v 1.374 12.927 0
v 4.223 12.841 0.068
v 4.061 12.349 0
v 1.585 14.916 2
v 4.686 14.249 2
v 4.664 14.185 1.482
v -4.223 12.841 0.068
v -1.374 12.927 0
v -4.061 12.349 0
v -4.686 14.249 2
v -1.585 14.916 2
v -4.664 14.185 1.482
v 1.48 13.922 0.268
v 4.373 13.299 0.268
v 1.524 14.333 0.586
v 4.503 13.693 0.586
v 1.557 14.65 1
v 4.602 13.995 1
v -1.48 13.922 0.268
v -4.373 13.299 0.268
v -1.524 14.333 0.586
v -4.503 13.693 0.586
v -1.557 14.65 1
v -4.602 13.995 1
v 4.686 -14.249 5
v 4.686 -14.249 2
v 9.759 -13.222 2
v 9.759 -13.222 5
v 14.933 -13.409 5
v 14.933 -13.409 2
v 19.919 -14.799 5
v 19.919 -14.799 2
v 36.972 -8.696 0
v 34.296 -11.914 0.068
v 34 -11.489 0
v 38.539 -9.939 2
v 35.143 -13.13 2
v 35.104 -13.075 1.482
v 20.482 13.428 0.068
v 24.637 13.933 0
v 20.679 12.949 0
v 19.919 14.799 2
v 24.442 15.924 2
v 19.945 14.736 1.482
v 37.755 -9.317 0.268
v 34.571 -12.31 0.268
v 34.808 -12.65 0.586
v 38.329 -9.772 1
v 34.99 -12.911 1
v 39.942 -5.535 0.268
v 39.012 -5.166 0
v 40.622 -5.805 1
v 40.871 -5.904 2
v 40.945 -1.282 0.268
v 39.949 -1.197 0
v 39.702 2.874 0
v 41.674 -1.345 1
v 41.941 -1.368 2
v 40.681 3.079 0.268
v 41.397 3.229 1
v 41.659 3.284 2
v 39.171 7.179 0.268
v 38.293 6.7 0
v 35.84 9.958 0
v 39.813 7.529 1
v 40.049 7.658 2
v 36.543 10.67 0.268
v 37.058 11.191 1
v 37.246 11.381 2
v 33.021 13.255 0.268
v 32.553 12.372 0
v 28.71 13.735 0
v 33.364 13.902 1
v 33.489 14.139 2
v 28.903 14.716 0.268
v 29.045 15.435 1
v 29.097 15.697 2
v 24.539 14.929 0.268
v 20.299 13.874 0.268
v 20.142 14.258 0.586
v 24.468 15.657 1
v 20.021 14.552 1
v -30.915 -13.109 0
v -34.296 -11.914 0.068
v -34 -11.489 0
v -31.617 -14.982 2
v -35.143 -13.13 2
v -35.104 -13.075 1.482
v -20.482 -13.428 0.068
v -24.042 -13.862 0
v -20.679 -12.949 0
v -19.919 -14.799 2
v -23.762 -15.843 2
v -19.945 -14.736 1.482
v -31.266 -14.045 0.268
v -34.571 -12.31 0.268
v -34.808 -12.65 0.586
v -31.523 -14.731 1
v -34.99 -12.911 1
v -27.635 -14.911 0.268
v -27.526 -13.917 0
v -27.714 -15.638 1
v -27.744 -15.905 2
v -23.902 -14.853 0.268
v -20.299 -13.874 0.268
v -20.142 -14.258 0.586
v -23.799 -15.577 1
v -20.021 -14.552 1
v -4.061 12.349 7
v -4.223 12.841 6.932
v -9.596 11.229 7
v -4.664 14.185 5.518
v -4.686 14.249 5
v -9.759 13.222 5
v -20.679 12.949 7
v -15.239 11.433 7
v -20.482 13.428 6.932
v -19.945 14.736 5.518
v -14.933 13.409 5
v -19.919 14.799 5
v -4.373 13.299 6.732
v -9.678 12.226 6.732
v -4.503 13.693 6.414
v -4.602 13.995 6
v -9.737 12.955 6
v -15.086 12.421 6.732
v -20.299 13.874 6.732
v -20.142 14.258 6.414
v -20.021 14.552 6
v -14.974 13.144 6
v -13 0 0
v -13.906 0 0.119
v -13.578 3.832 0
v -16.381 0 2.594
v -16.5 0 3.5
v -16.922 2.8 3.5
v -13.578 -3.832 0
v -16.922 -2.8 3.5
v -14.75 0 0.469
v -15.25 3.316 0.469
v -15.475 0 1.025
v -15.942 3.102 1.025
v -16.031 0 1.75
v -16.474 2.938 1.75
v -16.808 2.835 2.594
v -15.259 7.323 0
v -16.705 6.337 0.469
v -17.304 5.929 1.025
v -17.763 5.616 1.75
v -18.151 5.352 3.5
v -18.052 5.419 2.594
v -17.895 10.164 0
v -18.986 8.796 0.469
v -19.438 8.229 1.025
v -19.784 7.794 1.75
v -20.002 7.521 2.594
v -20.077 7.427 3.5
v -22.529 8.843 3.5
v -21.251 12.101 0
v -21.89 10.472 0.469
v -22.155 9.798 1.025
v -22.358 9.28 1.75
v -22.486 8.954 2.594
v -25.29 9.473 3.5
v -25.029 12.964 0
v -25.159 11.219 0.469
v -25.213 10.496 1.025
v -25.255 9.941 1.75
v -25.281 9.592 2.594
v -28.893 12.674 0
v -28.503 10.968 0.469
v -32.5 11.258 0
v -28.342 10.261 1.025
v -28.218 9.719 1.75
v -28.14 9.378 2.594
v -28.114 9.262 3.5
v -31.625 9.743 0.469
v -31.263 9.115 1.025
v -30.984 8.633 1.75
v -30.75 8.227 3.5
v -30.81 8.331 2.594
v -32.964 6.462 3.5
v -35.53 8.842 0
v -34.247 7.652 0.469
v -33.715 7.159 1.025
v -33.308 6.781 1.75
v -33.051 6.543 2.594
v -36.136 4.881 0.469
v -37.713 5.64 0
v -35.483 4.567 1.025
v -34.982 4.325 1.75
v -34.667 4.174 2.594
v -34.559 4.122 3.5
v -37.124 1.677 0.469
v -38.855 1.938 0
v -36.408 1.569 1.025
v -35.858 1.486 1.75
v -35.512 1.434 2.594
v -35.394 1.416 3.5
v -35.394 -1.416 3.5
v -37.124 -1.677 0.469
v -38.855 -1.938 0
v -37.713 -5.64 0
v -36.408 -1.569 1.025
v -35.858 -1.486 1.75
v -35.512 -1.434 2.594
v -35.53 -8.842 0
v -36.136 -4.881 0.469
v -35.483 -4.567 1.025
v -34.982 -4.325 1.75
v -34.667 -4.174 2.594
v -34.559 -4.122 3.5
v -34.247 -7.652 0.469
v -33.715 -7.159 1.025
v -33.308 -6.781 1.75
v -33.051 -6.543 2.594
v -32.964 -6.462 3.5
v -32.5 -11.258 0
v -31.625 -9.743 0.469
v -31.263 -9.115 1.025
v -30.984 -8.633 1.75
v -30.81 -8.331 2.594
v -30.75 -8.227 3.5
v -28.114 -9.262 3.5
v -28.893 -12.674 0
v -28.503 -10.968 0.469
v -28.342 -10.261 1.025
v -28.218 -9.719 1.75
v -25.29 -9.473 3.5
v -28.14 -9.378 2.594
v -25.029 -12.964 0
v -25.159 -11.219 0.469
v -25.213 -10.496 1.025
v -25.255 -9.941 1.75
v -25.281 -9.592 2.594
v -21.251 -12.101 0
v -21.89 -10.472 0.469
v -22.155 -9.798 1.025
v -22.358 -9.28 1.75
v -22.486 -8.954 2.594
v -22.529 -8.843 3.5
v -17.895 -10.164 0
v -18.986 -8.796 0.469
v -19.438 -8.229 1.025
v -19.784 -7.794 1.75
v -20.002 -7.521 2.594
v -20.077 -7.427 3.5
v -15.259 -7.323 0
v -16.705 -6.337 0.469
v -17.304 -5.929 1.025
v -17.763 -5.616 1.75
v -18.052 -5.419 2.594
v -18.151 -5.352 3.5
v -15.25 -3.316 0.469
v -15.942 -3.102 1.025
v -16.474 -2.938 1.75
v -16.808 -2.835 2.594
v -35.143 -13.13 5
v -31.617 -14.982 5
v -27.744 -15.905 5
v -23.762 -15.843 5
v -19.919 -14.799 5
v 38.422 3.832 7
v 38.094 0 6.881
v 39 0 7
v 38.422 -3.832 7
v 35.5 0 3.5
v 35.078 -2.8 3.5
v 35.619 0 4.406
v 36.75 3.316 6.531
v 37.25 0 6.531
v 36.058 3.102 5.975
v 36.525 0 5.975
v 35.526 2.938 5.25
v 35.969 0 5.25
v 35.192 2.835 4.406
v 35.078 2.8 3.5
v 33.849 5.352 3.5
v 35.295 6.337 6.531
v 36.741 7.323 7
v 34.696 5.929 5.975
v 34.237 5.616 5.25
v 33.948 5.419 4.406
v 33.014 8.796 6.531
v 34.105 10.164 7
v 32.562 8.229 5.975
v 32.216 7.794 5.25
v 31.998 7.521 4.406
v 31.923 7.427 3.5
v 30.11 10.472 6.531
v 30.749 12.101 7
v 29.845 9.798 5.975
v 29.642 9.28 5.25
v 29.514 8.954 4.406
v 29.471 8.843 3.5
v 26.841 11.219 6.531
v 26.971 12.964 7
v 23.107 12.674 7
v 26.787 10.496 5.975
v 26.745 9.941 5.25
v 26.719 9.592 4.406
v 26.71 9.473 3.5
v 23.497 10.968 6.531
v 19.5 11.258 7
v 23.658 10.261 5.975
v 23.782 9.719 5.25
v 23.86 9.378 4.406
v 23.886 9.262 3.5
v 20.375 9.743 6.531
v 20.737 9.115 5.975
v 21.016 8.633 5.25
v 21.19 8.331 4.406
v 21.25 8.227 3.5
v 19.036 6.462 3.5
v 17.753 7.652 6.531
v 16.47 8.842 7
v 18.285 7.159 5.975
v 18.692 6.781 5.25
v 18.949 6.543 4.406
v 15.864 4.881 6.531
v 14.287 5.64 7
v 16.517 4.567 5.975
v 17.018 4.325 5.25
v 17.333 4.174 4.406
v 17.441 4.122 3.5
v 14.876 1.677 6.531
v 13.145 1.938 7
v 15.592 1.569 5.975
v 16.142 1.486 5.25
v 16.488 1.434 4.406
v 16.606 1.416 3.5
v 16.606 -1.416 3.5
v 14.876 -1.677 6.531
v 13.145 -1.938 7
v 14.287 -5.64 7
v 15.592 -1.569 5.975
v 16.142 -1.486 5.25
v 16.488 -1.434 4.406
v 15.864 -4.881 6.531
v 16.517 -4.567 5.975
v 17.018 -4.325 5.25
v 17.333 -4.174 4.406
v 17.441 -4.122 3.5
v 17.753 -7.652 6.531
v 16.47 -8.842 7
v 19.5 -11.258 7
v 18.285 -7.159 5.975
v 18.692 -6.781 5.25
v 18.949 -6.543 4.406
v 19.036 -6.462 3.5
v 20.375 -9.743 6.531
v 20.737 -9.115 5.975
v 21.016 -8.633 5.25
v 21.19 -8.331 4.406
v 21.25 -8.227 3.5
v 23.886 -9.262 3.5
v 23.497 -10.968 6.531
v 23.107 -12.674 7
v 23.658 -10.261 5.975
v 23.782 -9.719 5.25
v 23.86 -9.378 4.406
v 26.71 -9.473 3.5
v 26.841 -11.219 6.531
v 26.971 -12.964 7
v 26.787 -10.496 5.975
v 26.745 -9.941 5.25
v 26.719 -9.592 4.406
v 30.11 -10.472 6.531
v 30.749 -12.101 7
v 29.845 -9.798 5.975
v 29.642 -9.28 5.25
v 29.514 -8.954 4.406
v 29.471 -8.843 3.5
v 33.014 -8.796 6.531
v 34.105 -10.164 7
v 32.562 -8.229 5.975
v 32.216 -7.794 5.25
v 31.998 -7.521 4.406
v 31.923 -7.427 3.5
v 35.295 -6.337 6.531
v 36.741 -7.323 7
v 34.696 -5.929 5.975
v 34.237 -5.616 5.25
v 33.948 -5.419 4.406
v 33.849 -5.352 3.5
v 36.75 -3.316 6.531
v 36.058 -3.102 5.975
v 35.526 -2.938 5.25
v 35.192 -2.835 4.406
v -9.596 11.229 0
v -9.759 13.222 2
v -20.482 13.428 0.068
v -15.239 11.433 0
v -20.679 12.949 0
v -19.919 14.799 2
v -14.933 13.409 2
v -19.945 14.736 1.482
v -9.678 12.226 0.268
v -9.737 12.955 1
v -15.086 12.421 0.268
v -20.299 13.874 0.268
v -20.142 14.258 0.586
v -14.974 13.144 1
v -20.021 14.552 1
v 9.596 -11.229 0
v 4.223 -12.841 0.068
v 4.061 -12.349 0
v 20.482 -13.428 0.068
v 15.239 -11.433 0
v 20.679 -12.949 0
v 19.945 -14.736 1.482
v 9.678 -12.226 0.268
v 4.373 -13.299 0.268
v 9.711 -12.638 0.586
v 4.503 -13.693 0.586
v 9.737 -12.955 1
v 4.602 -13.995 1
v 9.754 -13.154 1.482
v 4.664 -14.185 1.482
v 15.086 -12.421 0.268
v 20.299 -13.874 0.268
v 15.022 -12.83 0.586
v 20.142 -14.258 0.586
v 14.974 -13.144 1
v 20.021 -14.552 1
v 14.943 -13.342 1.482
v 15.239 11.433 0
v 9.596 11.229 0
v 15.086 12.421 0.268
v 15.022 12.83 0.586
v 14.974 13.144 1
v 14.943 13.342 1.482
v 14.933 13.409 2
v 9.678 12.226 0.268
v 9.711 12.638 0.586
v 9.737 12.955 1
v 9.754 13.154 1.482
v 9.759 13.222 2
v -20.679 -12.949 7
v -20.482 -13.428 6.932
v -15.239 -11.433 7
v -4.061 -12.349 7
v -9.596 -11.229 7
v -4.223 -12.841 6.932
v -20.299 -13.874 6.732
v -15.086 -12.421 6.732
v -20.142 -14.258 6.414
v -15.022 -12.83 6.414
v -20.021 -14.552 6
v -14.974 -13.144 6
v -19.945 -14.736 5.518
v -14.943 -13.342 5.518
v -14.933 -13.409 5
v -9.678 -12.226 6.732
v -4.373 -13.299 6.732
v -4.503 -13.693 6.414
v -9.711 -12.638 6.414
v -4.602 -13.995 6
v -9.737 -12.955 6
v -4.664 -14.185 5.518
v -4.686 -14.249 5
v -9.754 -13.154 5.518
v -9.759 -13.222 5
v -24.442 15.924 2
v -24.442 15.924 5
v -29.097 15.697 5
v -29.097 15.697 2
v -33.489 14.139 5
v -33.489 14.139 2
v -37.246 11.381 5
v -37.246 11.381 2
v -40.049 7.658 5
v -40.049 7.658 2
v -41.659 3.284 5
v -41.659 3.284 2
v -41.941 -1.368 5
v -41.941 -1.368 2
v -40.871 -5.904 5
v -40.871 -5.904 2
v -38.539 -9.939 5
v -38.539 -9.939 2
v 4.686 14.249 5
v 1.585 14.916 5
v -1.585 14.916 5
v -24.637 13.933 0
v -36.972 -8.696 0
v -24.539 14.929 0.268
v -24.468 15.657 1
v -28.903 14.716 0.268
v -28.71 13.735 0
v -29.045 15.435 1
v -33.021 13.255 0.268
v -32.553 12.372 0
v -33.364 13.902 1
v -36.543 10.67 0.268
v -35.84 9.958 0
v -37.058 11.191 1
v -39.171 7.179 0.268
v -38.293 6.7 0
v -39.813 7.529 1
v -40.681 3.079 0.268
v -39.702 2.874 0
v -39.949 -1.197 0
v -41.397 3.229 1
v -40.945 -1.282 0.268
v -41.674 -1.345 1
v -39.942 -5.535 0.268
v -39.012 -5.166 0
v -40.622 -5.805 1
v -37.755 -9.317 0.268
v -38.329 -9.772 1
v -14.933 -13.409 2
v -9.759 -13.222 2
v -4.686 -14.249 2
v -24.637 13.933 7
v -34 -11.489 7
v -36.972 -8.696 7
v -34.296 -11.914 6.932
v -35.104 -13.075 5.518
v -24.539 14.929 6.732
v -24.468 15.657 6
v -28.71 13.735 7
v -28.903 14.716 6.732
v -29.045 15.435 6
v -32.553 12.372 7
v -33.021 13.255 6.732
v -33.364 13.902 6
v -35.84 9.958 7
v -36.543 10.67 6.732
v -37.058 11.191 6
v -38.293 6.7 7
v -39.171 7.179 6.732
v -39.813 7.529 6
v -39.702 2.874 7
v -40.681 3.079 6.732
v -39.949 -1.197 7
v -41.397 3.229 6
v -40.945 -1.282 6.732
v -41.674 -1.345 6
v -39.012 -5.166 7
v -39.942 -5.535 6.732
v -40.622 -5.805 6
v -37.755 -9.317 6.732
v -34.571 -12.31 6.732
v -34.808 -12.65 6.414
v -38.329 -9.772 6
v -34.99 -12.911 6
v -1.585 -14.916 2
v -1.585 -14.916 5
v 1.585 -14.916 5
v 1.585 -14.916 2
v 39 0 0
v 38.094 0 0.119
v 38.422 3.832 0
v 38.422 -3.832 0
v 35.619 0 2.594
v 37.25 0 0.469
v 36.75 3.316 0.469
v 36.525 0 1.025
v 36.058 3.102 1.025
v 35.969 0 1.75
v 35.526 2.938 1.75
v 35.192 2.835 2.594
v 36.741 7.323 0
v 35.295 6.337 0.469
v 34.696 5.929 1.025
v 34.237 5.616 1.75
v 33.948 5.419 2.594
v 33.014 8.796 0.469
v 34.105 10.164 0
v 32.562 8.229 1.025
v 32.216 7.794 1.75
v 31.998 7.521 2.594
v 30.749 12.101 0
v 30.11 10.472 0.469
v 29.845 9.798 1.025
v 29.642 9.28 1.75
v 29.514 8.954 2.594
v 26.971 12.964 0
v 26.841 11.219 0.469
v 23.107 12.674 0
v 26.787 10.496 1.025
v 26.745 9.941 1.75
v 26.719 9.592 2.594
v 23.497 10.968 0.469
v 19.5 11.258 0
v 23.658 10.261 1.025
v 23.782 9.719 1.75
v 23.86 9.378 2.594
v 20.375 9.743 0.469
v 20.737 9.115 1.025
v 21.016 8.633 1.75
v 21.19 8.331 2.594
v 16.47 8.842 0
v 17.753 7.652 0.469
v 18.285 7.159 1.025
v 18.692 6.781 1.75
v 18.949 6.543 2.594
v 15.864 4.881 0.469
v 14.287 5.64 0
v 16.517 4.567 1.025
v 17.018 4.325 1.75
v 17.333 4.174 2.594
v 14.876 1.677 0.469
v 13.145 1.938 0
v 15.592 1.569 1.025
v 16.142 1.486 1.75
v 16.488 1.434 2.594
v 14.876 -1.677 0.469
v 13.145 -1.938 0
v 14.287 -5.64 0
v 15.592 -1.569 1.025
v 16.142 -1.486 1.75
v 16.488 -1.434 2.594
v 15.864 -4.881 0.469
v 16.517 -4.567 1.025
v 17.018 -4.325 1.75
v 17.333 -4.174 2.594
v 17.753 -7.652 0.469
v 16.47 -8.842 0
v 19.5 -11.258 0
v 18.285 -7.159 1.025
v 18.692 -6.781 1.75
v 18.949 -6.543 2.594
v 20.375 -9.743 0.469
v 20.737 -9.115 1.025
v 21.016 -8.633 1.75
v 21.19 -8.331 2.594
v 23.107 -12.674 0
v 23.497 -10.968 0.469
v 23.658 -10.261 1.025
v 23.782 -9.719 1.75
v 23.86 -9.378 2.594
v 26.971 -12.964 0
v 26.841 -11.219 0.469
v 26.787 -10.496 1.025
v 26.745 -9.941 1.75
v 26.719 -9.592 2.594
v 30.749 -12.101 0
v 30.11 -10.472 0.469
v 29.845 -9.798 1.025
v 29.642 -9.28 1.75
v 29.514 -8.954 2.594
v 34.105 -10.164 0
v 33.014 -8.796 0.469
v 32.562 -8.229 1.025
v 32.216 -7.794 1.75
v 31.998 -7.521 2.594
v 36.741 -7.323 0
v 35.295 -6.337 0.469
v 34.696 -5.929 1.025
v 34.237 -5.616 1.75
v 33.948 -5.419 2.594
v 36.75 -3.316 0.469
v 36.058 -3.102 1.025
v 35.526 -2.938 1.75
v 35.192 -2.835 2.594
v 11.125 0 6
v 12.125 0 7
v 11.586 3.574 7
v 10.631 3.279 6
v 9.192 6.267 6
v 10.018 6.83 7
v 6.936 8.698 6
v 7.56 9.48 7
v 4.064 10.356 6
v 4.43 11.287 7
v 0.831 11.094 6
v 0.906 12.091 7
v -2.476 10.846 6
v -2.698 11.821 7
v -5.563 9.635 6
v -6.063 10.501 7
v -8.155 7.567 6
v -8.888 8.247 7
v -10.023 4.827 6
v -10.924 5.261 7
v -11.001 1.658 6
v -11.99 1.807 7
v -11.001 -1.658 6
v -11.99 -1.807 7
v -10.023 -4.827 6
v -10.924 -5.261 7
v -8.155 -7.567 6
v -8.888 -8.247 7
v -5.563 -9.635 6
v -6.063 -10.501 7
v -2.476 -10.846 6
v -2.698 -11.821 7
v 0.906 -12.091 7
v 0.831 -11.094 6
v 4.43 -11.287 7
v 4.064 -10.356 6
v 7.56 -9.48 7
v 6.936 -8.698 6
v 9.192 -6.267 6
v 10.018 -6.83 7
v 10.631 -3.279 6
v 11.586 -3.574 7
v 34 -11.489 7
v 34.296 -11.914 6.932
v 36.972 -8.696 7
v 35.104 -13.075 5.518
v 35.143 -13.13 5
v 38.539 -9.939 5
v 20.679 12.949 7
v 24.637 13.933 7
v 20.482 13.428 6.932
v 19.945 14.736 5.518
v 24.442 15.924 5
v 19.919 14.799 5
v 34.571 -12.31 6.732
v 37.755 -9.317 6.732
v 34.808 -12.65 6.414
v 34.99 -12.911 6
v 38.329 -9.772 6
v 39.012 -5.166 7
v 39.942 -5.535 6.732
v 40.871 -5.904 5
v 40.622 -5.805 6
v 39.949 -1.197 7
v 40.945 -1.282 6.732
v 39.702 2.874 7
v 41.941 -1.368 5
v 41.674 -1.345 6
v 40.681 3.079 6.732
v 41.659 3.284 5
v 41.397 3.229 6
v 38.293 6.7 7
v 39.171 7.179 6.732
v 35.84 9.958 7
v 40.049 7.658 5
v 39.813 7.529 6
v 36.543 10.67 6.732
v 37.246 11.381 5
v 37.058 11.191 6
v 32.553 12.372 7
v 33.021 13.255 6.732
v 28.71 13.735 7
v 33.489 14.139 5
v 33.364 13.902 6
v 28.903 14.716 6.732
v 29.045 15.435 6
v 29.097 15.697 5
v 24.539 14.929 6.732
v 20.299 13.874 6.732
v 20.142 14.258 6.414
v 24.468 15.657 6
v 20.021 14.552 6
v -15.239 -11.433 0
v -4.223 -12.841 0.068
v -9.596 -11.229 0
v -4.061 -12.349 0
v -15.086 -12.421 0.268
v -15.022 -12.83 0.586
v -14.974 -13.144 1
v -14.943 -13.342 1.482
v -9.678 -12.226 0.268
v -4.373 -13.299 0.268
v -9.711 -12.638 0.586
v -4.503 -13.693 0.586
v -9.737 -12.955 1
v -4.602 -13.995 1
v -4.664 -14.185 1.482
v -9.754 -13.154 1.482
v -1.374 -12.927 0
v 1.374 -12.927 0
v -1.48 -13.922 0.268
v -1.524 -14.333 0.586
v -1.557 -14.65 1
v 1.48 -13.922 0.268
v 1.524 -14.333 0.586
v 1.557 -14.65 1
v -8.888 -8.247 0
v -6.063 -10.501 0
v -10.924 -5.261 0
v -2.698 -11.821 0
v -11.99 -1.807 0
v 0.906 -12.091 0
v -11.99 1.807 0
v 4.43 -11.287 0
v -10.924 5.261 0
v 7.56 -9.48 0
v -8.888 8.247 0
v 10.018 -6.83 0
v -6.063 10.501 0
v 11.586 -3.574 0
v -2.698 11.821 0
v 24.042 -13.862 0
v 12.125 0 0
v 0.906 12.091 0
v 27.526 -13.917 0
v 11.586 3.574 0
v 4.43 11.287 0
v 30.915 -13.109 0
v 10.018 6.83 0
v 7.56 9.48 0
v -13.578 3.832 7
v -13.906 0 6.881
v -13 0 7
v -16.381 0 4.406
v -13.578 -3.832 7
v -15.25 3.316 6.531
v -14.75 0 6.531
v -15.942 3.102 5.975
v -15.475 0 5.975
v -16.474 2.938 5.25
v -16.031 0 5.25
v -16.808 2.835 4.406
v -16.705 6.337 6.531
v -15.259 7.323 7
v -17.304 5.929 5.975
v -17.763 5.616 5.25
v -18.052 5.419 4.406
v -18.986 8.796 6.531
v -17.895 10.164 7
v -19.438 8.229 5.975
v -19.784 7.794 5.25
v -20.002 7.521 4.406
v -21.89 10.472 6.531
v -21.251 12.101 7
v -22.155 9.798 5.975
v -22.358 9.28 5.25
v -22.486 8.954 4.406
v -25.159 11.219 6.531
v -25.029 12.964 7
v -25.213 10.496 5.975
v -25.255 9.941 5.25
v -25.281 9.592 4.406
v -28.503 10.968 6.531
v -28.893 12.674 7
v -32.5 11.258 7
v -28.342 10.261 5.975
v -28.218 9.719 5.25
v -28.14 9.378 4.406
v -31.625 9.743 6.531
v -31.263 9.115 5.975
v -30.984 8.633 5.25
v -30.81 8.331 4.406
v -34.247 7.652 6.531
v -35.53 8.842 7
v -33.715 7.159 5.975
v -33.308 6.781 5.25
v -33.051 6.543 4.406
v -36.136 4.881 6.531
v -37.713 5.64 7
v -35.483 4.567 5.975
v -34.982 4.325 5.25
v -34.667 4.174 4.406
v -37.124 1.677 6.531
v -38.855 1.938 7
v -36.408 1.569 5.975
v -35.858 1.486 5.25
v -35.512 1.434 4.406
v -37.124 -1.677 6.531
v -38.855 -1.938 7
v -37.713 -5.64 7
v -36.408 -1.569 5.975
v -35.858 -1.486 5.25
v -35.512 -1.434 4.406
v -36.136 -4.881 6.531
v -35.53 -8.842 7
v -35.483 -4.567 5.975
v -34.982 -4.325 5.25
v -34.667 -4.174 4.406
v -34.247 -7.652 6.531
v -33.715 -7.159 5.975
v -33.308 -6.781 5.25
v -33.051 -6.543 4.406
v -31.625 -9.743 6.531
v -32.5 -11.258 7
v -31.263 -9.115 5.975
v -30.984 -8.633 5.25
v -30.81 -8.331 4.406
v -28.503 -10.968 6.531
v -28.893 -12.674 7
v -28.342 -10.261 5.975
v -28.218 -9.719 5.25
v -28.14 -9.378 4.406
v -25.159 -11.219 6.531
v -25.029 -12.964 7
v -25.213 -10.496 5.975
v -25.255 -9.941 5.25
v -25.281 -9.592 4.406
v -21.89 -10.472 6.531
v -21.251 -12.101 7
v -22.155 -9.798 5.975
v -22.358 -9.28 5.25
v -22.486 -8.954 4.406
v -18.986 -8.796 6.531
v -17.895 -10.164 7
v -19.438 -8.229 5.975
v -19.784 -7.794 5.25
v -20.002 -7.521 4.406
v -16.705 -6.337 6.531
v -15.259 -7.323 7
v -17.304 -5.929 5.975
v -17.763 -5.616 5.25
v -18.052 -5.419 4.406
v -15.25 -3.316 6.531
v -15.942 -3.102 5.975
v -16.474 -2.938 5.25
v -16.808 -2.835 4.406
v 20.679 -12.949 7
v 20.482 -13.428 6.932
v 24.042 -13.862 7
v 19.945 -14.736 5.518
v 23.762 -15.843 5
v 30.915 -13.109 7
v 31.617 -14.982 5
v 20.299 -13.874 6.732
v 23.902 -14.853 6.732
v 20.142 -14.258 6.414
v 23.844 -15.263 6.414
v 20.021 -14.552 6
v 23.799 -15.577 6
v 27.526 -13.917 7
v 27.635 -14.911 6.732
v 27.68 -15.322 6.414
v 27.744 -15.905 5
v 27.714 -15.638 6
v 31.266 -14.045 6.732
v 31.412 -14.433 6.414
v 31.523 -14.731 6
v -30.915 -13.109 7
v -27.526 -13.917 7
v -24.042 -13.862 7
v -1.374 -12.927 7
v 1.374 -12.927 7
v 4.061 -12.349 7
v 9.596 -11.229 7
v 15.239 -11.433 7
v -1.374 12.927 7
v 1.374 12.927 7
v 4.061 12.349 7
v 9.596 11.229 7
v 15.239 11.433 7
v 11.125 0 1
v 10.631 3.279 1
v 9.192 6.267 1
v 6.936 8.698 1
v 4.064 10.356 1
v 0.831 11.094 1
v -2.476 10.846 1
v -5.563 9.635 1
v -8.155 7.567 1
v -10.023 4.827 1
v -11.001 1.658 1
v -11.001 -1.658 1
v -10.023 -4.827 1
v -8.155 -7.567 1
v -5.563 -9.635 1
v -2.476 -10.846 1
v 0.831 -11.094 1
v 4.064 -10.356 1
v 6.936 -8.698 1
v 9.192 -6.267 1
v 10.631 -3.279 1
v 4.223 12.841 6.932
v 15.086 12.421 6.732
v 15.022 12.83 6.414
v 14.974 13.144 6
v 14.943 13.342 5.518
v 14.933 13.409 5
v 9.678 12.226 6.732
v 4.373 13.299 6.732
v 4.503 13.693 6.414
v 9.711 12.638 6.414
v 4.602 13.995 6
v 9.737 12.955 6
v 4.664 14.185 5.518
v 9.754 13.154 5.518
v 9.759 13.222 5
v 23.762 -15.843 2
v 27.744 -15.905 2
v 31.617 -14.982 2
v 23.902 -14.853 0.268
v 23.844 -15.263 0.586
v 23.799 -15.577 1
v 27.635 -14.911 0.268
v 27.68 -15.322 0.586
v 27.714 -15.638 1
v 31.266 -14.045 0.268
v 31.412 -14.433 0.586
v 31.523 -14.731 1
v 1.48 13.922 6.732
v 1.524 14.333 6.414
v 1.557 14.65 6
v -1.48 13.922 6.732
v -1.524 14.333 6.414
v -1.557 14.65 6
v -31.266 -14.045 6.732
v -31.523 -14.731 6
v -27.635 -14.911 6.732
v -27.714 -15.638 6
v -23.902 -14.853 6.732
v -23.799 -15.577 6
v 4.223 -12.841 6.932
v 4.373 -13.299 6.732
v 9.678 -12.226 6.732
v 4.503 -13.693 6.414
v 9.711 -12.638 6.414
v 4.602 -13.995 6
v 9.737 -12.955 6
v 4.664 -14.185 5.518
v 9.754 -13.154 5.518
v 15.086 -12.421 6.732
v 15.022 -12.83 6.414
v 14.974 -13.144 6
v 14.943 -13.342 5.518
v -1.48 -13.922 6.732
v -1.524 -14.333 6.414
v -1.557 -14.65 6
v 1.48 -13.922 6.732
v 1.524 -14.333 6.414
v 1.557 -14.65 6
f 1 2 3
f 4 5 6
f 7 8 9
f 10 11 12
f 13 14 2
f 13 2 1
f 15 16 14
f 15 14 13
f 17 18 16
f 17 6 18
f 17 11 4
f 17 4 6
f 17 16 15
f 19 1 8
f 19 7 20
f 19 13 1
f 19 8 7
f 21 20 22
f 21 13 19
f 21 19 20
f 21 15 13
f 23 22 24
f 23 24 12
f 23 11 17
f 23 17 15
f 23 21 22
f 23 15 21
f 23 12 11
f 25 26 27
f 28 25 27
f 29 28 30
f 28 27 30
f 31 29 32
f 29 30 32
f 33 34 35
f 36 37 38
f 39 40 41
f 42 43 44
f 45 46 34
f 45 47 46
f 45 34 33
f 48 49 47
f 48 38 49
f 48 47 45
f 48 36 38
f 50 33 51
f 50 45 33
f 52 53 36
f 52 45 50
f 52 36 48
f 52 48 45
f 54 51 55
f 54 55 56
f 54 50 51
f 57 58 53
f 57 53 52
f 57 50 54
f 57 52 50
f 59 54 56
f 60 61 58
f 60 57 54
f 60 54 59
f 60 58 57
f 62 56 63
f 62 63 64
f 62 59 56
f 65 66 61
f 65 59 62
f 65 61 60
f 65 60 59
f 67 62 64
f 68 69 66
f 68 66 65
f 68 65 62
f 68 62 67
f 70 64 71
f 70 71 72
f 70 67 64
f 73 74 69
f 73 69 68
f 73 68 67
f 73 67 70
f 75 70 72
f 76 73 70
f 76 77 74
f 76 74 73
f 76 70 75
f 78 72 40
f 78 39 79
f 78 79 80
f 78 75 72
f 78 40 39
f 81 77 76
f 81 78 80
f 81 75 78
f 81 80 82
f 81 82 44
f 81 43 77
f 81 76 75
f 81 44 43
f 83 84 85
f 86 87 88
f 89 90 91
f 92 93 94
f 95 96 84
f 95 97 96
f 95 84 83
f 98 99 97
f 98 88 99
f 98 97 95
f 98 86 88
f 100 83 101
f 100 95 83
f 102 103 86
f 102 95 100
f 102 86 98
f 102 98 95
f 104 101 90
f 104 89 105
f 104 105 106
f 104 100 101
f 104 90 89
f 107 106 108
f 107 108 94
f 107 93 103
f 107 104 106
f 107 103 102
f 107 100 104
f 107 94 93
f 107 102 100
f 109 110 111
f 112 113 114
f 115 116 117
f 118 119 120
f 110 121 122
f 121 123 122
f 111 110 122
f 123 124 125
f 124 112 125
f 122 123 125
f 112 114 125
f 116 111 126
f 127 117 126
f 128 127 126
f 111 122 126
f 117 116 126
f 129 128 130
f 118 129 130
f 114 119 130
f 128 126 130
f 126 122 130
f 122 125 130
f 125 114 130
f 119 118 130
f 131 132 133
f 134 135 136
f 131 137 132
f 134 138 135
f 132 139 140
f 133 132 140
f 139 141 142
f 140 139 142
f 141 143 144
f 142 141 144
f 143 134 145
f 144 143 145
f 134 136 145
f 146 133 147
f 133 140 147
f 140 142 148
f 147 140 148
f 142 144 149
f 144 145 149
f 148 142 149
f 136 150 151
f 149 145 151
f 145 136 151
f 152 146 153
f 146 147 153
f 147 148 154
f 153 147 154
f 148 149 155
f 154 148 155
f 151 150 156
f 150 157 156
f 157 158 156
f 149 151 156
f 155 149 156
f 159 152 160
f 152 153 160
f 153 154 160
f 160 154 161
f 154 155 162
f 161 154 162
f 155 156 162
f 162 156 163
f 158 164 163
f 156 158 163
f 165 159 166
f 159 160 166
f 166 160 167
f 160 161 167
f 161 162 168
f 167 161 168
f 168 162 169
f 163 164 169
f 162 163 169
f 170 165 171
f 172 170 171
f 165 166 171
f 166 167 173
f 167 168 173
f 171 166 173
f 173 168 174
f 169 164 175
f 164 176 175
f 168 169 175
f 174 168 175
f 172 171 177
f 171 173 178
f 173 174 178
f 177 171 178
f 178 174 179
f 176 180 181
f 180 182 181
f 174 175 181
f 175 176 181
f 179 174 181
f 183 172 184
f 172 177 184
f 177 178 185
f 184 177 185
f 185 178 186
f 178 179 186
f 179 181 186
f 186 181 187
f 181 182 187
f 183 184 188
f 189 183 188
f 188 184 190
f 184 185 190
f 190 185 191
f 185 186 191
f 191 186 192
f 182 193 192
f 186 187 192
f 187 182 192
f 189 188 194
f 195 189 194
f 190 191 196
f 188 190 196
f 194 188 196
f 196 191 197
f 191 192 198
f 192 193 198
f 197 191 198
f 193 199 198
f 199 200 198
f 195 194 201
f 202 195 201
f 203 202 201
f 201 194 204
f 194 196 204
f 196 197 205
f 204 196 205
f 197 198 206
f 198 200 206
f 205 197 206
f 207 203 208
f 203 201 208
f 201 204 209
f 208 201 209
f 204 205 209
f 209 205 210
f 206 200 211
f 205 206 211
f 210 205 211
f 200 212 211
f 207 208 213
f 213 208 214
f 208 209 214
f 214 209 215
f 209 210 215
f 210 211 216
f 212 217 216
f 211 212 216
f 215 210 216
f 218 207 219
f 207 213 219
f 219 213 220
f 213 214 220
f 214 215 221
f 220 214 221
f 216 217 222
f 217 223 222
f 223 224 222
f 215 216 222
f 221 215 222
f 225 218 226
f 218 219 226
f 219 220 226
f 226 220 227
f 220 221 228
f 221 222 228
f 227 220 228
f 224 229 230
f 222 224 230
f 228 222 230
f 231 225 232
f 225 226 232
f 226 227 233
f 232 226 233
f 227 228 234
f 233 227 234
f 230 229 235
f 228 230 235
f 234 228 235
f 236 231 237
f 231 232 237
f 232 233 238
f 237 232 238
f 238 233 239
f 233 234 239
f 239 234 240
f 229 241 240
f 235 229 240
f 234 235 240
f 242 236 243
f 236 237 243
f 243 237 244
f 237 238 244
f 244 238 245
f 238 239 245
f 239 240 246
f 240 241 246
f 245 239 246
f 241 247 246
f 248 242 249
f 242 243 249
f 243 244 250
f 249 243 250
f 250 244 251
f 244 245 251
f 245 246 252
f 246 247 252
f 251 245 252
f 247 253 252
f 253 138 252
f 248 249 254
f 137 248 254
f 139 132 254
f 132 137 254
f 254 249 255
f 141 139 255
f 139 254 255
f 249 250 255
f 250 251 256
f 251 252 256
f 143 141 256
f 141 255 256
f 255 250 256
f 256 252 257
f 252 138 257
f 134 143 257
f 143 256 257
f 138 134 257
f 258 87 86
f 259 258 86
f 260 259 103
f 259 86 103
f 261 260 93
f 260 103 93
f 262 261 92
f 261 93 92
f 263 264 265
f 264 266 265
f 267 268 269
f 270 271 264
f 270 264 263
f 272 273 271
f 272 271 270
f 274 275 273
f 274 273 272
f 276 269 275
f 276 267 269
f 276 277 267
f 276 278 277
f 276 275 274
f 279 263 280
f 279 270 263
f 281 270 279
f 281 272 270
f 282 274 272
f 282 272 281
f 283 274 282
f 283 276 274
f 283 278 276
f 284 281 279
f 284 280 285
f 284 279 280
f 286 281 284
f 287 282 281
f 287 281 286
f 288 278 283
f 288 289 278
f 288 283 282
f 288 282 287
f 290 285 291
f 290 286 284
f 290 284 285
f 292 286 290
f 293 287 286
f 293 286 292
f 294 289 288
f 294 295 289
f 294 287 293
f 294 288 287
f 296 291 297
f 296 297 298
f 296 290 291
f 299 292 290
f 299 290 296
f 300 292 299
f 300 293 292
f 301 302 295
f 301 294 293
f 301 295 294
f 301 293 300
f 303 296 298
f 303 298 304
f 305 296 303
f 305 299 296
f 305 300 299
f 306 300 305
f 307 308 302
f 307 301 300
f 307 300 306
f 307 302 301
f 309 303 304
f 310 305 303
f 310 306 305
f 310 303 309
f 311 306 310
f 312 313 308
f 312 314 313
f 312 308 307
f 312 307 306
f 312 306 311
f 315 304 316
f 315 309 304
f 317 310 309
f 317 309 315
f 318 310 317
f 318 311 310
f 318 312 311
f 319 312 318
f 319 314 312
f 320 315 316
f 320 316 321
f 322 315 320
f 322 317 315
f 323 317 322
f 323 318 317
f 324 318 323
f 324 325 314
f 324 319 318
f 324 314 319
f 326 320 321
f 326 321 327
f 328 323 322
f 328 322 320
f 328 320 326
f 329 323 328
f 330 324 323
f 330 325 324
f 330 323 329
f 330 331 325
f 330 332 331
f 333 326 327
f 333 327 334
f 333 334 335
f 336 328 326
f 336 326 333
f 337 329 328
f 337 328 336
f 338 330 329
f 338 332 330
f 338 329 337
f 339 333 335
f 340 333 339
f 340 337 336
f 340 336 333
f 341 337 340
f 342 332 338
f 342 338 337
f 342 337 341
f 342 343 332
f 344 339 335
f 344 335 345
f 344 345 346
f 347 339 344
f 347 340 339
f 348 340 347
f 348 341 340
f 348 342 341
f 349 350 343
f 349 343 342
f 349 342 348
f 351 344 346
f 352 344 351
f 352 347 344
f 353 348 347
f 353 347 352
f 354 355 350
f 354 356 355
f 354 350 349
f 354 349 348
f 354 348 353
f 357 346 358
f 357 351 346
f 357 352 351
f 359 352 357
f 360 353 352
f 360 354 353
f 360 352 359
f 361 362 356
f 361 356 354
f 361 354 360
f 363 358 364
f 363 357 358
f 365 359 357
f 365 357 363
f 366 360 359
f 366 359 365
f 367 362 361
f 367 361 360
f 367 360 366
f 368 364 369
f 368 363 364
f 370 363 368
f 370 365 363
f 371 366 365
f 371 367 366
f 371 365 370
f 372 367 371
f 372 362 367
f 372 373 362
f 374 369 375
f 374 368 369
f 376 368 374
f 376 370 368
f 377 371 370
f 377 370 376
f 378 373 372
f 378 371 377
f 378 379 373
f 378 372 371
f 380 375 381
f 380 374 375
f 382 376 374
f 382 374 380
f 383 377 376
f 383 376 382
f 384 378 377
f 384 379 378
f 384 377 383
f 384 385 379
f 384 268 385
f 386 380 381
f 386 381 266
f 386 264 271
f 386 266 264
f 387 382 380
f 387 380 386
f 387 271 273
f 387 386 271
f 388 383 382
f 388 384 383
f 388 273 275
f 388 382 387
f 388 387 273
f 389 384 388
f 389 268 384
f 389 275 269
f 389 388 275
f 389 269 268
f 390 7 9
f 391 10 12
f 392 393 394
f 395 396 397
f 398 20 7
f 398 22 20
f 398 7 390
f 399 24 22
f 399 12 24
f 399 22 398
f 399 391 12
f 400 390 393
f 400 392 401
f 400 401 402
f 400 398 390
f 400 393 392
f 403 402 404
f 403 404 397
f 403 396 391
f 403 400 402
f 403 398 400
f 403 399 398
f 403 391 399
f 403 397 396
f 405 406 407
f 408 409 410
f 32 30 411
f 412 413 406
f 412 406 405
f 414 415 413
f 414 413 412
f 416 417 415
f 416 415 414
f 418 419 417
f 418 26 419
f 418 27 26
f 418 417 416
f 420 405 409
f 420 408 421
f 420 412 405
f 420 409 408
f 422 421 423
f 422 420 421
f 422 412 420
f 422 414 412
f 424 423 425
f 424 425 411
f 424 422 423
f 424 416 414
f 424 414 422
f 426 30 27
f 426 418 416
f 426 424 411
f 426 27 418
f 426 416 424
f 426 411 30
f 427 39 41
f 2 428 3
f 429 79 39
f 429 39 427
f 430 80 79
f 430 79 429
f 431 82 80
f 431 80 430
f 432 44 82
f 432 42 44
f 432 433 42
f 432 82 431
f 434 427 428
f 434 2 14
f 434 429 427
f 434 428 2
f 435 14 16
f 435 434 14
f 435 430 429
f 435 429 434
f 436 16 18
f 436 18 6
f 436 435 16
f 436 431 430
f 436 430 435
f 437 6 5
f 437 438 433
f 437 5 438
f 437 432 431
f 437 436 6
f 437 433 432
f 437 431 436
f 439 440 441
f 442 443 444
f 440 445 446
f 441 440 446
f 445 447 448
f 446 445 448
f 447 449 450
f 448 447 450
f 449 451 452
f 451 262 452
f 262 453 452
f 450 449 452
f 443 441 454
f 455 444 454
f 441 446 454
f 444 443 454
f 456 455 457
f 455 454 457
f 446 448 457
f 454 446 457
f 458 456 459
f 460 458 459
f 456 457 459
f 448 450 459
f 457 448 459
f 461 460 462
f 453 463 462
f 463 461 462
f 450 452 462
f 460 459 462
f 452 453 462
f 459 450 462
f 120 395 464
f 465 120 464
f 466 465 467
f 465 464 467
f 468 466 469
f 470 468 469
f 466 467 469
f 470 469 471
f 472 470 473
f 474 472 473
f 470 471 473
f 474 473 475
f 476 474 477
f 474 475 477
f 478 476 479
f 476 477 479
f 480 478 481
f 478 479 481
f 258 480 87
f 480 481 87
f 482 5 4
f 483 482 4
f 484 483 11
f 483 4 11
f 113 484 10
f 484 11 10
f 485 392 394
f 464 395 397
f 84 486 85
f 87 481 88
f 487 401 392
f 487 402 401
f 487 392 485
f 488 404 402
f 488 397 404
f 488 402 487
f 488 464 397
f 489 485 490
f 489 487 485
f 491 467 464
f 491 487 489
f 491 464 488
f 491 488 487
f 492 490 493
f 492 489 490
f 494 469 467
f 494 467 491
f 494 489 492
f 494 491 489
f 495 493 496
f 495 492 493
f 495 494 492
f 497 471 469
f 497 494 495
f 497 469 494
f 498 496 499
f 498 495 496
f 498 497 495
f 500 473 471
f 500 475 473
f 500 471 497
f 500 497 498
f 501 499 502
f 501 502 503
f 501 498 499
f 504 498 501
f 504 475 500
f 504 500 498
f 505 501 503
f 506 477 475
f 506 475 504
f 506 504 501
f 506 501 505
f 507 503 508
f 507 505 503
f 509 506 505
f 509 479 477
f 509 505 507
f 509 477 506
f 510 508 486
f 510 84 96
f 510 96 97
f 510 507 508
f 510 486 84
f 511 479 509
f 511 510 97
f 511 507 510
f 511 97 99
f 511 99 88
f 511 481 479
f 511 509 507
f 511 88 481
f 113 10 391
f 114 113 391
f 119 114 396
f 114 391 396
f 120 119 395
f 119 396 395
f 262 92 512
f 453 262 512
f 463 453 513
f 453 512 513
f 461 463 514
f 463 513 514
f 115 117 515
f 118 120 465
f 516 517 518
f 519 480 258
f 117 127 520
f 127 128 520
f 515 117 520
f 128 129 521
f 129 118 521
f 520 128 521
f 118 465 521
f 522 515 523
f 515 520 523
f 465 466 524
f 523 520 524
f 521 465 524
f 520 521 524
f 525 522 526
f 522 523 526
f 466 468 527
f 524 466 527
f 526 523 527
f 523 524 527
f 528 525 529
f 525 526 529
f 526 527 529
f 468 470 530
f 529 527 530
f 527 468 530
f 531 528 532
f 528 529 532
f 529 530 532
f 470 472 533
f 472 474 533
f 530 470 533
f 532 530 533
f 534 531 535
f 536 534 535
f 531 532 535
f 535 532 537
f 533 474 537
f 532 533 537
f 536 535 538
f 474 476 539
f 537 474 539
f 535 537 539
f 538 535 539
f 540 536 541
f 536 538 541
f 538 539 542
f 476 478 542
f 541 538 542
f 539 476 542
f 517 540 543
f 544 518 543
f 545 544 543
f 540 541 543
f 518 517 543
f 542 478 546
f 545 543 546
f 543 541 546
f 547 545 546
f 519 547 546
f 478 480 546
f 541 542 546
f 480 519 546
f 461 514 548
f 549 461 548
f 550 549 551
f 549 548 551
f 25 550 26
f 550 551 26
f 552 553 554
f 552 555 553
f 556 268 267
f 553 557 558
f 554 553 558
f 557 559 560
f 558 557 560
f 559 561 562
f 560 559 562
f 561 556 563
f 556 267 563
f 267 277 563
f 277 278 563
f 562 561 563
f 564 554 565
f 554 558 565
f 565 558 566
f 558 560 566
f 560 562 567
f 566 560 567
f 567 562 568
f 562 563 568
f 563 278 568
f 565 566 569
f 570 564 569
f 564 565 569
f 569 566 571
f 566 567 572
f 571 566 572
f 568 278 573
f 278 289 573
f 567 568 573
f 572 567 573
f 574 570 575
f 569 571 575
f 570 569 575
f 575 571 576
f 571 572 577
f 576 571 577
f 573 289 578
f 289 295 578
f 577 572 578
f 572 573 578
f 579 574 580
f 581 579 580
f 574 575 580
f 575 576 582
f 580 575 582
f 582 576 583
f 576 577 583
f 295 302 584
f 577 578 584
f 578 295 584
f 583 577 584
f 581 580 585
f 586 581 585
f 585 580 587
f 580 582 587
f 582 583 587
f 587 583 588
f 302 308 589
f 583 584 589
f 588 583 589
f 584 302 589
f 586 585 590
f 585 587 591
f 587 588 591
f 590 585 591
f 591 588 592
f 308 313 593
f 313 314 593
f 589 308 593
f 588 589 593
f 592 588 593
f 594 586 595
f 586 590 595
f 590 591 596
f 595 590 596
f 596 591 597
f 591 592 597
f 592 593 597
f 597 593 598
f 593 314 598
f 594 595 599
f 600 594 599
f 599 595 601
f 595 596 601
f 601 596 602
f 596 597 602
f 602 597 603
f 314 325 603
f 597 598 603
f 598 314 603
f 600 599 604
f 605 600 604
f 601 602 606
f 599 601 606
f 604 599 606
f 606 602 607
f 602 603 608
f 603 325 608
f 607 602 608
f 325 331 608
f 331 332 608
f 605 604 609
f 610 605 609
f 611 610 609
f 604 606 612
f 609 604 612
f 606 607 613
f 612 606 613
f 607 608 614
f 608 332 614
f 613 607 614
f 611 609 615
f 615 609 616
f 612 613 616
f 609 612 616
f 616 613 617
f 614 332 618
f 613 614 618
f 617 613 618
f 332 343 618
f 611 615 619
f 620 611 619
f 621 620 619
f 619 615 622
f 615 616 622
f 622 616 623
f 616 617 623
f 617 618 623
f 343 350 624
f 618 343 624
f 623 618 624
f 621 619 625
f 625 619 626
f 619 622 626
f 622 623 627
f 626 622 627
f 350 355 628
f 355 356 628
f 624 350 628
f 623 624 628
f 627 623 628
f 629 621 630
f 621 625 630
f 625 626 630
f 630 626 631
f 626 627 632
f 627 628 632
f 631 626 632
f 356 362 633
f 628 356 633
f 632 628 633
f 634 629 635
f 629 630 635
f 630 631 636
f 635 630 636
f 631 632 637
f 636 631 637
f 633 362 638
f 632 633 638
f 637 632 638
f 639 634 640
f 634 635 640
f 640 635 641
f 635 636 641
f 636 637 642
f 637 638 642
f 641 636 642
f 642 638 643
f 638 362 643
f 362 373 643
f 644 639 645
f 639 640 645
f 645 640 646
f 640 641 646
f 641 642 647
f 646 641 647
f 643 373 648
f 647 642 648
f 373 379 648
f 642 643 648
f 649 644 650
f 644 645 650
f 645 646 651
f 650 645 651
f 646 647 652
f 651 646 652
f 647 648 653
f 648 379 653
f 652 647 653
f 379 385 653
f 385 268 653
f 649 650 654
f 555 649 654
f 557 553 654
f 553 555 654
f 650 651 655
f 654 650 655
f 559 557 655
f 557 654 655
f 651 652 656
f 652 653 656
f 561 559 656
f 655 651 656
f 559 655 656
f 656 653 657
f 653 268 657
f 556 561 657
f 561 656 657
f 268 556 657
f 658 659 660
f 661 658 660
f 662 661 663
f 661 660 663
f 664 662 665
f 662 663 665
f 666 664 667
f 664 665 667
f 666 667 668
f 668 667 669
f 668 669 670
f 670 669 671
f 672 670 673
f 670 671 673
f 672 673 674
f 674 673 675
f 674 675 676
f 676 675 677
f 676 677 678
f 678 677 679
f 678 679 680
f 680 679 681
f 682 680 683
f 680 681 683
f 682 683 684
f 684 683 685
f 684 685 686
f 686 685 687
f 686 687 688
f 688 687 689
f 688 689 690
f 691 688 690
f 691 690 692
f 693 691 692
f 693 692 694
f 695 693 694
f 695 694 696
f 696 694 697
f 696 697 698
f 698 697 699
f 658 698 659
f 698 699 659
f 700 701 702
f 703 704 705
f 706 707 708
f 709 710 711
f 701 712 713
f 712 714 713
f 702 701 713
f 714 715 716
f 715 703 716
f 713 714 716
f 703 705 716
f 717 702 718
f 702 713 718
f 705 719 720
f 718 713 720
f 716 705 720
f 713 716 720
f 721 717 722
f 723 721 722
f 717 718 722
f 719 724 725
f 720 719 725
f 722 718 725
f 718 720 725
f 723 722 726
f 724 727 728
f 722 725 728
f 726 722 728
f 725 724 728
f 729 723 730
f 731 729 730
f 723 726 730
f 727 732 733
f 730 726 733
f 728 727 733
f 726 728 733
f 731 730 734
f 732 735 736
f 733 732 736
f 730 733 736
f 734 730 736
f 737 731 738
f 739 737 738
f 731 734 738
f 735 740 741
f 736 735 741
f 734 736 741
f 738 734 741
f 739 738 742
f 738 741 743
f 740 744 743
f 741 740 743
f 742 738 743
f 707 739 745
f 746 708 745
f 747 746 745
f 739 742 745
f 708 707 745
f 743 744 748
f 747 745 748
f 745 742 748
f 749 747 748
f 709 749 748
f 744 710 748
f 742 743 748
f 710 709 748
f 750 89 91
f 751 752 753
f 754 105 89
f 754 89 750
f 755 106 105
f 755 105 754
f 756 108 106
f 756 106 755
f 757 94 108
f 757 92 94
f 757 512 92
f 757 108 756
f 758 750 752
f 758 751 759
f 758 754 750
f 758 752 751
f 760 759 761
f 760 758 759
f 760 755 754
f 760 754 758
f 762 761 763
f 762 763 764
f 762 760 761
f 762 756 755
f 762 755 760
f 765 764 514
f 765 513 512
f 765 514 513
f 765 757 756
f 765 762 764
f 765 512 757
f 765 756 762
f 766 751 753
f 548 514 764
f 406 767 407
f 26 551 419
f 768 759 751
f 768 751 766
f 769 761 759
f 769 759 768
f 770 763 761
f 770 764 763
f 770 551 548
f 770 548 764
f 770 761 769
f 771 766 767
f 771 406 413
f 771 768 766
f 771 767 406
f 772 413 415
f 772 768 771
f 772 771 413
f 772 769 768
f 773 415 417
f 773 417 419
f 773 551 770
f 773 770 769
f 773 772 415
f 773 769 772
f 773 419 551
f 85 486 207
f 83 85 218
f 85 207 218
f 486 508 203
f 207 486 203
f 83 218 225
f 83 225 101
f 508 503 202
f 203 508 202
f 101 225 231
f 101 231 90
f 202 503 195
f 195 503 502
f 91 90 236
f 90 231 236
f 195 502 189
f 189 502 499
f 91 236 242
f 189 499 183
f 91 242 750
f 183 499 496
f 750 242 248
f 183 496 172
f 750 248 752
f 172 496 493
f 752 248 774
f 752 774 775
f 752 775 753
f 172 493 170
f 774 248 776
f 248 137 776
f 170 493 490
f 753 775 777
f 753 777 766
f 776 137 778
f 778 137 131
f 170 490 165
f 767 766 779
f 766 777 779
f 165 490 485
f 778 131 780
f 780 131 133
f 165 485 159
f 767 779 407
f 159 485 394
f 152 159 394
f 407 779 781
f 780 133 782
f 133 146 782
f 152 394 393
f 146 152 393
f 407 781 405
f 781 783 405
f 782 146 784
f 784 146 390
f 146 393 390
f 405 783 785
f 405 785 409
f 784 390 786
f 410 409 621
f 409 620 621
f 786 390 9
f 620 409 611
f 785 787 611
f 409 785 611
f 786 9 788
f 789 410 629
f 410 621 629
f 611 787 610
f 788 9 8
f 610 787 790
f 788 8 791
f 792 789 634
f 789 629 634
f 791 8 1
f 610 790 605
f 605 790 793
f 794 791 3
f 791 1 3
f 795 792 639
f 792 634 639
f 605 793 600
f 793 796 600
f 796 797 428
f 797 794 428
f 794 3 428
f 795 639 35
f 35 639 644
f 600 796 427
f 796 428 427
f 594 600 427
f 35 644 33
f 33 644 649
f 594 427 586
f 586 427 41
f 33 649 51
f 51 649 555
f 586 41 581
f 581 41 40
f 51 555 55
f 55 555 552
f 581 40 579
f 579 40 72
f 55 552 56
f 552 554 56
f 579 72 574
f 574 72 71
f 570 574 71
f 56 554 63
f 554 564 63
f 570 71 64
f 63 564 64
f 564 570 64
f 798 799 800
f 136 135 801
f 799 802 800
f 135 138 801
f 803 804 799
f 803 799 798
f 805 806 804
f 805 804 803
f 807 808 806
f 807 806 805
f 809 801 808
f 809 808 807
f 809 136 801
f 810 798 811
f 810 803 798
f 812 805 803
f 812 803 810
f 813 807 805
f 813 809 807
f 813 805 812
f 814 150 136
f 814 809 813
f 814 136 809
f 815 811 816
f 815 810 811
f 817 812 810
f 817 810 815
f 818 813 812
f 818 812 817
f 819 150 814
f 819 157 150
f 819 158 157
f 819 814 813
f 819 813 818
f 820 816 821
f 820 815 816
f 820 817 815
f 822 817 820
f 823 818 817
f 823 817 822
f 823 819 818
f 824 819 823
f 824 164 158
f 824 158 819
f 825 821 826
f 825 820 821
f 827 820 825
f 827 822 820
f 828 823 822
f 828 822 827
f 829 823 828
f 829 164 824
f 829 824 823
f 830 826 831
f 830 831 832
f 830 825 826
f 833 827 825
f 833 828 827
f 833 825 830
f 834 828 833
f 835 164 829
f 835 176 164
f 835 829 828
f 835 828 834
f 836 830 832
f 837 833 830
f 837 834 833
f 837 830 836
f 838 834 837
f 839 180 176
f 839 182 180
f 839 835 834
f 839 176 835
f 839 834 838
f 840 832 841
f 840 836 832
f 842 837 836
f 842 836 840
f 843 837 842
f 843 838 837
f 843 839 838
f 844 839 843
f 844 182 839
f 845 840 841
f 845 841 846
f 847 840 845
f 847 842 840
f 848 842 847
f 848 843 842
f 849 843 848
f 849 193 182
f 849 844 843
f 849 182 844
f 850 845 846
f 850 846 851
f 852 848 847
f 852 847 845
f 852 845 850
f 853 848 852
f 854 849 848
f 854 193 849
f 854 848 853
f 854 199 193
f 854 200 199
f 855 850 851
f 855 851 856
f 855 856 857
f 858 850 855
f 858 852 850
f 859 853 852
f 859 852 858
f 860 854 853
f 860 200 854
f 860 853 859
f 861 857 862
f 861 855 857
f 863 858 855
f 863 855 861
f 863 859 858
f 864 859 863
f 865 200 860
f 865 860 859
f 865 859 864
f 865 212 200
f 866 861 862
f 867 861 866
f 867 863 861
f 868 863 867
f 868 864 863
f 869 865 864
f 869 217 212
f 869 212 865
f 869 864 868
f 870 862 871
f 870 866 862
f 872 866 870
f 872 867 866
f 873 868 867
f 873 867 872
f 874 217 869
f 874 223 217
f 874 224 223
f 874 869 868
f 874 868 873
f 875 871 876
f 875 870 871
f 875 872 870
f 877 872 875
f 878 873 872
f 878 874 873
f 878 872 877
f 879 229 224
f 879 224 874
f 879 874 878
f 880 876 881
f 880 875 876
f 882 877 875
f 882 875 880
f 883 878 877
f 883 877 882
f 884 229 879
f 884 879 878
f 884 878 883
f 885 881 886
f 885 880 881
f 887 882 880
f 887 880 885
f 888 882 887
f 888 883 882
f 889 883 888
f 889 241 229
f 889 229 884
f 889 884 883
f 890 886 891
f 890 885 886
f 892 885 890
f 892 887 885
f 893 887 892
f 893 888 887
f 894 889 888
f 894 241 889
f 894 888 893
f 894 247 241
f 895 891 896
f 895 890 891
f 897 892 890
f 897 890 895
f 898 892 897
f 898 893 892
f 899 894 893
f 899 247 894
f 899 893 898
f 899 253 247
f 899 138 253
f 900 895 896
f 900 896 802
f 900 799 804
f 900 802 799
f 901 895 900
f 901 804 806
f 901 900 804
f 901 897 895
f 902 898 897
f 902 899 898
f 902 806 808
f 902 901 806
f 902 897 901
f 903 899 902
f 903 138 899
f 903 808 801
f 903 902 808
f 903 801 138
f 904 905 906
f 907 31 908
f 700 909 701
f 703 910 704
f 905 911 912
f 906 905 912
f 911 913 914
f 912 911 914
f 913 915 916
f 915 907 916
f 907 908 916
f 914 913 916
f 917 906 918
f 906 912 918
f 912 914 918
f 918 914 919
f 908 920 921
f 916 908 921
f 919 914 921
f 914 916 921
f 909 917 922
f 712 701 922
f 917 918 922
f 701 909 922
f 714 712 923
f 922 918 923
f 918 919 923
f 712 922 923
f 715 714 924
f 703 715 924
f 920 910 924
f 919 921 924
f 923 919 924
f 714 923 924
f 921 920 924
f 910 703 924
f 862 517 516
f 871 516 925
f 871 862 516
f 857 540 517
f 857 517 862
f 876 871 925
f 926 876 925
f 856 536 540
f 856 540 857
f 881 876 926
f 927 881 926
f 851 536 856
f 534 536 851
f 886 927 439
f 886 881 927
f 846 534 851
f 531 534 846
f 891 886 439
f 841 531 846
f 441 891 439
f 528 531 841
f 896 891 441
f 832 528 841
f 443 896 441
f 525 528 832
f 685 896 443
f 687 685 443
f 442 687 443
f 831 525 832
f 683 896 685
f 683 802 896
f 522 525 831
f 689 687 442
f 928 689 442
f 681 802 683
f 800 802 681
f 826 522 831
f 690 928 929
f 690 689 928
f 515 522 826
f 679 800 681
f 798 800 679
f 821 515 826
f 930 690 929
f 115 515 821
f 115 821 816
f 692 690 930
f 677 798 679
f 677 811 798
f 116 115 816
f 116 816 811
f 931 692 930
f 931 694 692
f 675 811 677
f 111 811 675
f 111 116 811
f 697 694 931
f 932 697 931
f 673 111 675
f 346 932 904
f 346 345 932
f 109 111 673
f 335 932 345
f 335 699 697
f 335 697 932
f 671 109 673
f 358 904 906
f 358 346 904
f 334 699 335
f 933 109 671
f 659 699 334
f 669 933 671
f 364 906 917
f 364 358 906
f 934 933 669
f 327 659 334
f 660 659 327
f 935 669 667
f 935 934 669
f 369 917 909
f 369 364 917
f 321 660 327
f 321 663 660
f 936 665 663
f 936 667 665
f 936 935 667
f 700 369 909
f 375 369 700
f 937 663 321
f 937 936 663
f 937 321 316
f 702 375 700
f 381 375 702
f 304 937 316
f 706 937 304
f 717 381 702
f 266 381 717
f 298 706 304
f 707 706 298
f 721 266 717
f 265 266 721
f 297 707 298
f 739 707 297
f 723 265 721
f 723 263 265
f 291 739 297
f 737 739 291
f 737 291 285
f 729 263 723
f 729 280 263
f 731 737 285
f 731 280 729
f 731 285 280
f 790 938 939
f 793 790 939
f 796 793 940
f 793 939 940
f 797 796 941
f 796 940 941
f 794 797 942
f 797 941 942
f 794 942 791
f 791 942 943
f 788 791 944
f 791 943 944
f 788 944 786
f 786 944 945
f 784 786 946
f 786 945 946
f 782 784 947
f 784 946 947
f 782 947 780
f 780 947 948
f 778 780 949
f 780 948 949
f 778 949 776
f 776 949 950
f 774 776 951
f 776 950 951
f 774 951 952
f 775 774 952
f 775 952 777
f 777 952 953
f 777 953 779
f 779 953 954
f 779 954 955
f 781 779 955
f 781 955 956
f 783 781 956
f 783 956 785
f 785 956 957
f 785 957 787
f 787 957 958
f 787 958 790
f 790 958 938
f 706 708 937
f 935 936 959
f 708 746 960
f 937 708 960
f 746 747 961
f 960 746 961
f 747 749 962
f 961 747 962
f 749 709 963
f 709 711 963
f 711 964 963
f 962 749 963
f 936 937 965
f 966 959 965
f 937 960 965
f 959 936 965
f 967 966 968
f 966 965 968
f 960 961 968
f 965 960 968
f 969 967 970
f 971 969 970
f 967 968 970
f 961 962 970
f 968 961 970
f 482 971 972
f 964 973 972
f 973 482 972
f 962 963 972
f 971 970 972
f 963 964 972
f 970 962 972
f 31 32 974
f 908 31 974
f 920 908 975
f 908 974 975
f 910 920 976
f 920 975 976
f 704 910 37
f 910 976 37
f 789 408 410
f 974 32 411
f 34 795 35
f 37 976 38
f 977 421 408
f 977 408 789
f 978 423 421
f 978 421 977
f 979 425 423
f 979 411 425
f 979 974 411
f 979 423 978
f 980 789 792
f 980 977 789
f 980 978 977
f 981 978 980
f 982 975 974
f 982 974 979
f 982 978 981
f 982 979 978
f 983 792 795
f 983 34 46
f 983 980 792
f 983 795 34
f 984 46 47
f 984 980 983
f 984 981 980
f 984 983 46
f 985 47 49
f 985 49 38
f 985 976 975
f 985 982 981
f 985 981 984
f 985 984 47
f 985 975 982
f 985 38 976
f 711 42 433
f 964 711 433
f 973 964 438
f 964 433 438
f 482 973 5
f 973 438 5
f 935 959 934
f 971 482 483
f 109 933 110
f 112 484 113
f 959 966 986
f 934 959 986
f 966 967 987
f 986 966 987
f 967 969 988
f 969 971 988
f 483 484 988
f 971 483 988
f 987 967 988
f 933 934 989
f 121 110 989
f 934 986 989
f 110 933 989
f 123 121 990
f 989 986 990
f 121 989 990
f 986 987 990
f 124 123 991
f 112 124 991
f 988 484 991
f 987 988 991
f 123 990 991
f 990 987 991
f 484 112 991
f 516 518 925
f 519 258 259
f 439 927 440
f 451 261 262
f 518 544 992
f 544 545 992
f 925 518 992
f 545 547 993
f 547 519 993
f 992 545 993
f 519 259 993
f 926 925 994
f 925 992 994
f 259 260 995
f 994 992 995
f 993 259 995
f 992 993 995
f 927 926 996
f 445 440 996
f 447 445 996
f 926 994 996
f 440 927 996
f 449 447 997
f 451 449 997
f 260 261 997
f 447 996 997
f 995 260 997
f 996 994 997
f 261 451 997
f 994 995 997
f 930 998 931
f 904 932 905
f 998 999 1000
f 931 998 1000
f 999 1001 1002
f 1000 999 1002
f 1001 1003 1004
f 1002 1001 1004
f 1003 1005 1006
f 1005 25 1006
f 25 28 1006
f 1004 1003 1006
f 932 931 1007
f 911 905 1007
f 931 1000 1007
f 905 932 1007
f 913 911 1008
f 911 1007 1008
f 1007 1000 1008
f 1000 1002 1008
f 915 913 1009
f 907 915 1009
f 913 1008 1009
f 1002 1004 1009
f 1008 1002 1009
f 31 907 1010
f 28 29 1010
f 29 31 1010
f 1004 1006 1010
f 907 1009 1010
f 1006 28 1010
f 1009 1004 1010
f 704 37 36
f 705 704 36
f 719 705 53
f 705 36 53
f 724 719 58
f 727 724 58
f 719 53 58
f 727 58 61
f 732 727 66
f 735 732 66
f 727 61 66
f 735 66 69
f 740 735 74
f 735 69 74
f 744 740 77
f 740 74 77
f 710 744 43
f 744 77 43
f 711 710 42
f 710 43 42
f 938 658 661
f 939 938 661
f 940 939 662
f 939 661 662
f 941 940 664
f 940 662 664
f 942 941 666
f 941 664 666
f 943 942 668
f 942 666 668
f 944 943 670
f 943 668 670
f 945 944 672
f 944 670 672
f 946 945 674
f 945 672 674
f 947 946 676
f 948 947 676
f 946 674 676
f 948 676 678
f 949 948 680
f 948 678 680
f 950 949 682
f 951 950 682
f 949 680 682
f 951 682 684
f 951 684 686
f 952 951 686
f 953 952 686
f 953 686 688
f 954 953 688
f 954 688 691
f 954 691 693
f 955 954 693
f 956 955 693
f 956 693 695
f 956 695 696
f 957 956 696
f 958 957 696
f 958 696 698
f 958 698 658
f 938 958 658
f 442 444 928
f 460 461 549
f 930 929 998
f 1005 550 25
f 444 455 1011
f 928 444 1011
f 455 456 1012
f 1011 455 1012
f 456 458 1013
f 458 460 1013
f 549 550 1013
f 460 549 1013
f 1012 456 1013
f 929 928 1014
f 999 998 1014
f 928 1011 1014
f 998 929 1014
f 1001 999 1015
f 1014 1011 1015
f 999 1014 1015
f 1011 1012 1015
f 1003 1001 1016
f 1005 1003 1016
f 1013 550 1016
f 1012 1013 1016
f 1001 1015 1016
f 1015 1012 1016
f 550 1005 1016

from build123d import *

# Parameters (mm, degrees)
F1_DEPTH = 7
F2_R     = 11.125
F3_DEPTH = 7.001
F4_R     = 2
F5_R     = 9.5
F6_DEPTH = 7.001
F7_R     = 3.49999
F8_SIZE  = 1


# Not quite as in the source:
# - a fillet or chamfer is up to 0.001 mm smaller than in the source, because OpenCascade refuses the exact size


with BuildPart() as f1:
    # F0 (on Top) → F1 (new body)
    with BuildSketch(Plane.XY):
        with BuildLine():
            ThreePointArc((-19.9190283401, -14.7993845707), (-12.3514453516, -13.1628621978), (-4.6855509356, -14.2494074414))
            ThreePointArc((-4.6855509356, -14.2494074414), (0, -15), (4.6855509356, -14.2494074414))
            ThreePointArc((4.6855509356, -14.2494074414), (12.3514453516, -13.1628621978), (19.9190283401, -14.7993845707))
            ThreePointArc((19.9190283401, -14.7993845707), (27.7435994179, -15.9047119141), (35.1428571429, -13.1304289064))
            ThreePointArc((35.1428571429, -13.1304289064), (40.048573091, 7.6575187957), (19.9190283401, 14.7993845707))
            ThreePointArc((19.9190283401, 14.7993845707), (12.3514453516, 13.1628621978), (4.6855509356, 14.2494074414))
            ThreePointArc((4.6855509356, 14.2494074414), (0, 15), (-4.6855509356, 14.2494074414))
            ThreePointArc((-4.6855509356, 14.2494074414), (-12.3514453516, 13.1628621978), (-19.9190283401, 14.7993845707))
            ThreePointArc((-19.9190283401, 14.7993845707), (-40.048573091, 7.6575187957), (-35.1428571429, -13.1304289064))
            ThreePointArc((-35.1428571429, -13.1304289064), (-27.7435994179, -15.9047119141), (-19.9190283401, -14.7993845707))
        make_face()
    extrude(amount=F1_DEPTH)

    # F2 (on face) → F3 (cut, through all)
    with BuildSketch(Plane.XY.offset(7)):
        Circle(F2_R)
    extrude(amount=-F3_DEPTH, mode=Mode.SUBTRACT)

    # F4
    f4_edges = [f1.edges().sort_by_distance(p)[0] for p in [
        (-19.919028, -14.799385, 3.5),
        (-42, 0, 0),
        (-19.919028, 14.799385, 3.5),
        (-42, 0, 7),
        (-4.685551, -14.249407, 3.5),
        (-12.351445, -13.162862, 0),
        (-12.351445, -13.162862, 7),
        (4.685551, -14.249407, 3.5),
        (0, -15, 0),
        (0, -15, 7),
        (19.919028, -14.799385, 3.5),
        (12.351445, -13.162862, 0),
        (12.351445, -13.162862, 7),
        (42, 0, 7),
        (19.919028, 14.799385, 3.5),
        (42, 0, 0),
        (4.685551, 14.249407, 3.5),
        (12.351445, 13.162862, 0),
        (12.351445, 13.162862, 7),
        (-4.685551, 14.249407, 3.5),
        (0, 15, 0),
        (0, 15, 7),
        (-12.351445, 13.162862, 0),
        (-12.351445, 13.162862, 7),
    ]]
    fillet(f4_edges, radius=F4_R)

    # F5 (on face) → F6 (cut, through all)
    with BuildSketch(Plane.XY.offset(7)):
        with Locations((-26, 0)):
            Circle(F5_R)
        with Locations((26, 0)):
            Circle(F5_R)
    extrude(amount=-F6_DEPTH, mode=Mode.SUBTRACT)

    # F7 (radius 3.5 in the source; OpenCascade refuses exactly that, so slightly less here)
    f7_edges = [f1.edges().sort_by_distance(p)[0] for p in [
        (-35.5, 0, 7),
        (-16.5, 0, 3.5),
        (-35.5, 0, 0),
        (16.5, 0, 7),
        (35.5, 0, 3.5),
        (16.5, 0, 0),
    ]]
    fillet(f7_edges, radius=F7_R)

    # F8
    f8_edges = [f1.edges().sort_by_distance(p)[0] for p in [
        (-11.125, 0, 7),
        (11.125, 0, 3.5),
        (-11.125, 0, 0),
    ]]
    chamfer(f8_edges, length=F8_SIZE)


solid = f1.part
